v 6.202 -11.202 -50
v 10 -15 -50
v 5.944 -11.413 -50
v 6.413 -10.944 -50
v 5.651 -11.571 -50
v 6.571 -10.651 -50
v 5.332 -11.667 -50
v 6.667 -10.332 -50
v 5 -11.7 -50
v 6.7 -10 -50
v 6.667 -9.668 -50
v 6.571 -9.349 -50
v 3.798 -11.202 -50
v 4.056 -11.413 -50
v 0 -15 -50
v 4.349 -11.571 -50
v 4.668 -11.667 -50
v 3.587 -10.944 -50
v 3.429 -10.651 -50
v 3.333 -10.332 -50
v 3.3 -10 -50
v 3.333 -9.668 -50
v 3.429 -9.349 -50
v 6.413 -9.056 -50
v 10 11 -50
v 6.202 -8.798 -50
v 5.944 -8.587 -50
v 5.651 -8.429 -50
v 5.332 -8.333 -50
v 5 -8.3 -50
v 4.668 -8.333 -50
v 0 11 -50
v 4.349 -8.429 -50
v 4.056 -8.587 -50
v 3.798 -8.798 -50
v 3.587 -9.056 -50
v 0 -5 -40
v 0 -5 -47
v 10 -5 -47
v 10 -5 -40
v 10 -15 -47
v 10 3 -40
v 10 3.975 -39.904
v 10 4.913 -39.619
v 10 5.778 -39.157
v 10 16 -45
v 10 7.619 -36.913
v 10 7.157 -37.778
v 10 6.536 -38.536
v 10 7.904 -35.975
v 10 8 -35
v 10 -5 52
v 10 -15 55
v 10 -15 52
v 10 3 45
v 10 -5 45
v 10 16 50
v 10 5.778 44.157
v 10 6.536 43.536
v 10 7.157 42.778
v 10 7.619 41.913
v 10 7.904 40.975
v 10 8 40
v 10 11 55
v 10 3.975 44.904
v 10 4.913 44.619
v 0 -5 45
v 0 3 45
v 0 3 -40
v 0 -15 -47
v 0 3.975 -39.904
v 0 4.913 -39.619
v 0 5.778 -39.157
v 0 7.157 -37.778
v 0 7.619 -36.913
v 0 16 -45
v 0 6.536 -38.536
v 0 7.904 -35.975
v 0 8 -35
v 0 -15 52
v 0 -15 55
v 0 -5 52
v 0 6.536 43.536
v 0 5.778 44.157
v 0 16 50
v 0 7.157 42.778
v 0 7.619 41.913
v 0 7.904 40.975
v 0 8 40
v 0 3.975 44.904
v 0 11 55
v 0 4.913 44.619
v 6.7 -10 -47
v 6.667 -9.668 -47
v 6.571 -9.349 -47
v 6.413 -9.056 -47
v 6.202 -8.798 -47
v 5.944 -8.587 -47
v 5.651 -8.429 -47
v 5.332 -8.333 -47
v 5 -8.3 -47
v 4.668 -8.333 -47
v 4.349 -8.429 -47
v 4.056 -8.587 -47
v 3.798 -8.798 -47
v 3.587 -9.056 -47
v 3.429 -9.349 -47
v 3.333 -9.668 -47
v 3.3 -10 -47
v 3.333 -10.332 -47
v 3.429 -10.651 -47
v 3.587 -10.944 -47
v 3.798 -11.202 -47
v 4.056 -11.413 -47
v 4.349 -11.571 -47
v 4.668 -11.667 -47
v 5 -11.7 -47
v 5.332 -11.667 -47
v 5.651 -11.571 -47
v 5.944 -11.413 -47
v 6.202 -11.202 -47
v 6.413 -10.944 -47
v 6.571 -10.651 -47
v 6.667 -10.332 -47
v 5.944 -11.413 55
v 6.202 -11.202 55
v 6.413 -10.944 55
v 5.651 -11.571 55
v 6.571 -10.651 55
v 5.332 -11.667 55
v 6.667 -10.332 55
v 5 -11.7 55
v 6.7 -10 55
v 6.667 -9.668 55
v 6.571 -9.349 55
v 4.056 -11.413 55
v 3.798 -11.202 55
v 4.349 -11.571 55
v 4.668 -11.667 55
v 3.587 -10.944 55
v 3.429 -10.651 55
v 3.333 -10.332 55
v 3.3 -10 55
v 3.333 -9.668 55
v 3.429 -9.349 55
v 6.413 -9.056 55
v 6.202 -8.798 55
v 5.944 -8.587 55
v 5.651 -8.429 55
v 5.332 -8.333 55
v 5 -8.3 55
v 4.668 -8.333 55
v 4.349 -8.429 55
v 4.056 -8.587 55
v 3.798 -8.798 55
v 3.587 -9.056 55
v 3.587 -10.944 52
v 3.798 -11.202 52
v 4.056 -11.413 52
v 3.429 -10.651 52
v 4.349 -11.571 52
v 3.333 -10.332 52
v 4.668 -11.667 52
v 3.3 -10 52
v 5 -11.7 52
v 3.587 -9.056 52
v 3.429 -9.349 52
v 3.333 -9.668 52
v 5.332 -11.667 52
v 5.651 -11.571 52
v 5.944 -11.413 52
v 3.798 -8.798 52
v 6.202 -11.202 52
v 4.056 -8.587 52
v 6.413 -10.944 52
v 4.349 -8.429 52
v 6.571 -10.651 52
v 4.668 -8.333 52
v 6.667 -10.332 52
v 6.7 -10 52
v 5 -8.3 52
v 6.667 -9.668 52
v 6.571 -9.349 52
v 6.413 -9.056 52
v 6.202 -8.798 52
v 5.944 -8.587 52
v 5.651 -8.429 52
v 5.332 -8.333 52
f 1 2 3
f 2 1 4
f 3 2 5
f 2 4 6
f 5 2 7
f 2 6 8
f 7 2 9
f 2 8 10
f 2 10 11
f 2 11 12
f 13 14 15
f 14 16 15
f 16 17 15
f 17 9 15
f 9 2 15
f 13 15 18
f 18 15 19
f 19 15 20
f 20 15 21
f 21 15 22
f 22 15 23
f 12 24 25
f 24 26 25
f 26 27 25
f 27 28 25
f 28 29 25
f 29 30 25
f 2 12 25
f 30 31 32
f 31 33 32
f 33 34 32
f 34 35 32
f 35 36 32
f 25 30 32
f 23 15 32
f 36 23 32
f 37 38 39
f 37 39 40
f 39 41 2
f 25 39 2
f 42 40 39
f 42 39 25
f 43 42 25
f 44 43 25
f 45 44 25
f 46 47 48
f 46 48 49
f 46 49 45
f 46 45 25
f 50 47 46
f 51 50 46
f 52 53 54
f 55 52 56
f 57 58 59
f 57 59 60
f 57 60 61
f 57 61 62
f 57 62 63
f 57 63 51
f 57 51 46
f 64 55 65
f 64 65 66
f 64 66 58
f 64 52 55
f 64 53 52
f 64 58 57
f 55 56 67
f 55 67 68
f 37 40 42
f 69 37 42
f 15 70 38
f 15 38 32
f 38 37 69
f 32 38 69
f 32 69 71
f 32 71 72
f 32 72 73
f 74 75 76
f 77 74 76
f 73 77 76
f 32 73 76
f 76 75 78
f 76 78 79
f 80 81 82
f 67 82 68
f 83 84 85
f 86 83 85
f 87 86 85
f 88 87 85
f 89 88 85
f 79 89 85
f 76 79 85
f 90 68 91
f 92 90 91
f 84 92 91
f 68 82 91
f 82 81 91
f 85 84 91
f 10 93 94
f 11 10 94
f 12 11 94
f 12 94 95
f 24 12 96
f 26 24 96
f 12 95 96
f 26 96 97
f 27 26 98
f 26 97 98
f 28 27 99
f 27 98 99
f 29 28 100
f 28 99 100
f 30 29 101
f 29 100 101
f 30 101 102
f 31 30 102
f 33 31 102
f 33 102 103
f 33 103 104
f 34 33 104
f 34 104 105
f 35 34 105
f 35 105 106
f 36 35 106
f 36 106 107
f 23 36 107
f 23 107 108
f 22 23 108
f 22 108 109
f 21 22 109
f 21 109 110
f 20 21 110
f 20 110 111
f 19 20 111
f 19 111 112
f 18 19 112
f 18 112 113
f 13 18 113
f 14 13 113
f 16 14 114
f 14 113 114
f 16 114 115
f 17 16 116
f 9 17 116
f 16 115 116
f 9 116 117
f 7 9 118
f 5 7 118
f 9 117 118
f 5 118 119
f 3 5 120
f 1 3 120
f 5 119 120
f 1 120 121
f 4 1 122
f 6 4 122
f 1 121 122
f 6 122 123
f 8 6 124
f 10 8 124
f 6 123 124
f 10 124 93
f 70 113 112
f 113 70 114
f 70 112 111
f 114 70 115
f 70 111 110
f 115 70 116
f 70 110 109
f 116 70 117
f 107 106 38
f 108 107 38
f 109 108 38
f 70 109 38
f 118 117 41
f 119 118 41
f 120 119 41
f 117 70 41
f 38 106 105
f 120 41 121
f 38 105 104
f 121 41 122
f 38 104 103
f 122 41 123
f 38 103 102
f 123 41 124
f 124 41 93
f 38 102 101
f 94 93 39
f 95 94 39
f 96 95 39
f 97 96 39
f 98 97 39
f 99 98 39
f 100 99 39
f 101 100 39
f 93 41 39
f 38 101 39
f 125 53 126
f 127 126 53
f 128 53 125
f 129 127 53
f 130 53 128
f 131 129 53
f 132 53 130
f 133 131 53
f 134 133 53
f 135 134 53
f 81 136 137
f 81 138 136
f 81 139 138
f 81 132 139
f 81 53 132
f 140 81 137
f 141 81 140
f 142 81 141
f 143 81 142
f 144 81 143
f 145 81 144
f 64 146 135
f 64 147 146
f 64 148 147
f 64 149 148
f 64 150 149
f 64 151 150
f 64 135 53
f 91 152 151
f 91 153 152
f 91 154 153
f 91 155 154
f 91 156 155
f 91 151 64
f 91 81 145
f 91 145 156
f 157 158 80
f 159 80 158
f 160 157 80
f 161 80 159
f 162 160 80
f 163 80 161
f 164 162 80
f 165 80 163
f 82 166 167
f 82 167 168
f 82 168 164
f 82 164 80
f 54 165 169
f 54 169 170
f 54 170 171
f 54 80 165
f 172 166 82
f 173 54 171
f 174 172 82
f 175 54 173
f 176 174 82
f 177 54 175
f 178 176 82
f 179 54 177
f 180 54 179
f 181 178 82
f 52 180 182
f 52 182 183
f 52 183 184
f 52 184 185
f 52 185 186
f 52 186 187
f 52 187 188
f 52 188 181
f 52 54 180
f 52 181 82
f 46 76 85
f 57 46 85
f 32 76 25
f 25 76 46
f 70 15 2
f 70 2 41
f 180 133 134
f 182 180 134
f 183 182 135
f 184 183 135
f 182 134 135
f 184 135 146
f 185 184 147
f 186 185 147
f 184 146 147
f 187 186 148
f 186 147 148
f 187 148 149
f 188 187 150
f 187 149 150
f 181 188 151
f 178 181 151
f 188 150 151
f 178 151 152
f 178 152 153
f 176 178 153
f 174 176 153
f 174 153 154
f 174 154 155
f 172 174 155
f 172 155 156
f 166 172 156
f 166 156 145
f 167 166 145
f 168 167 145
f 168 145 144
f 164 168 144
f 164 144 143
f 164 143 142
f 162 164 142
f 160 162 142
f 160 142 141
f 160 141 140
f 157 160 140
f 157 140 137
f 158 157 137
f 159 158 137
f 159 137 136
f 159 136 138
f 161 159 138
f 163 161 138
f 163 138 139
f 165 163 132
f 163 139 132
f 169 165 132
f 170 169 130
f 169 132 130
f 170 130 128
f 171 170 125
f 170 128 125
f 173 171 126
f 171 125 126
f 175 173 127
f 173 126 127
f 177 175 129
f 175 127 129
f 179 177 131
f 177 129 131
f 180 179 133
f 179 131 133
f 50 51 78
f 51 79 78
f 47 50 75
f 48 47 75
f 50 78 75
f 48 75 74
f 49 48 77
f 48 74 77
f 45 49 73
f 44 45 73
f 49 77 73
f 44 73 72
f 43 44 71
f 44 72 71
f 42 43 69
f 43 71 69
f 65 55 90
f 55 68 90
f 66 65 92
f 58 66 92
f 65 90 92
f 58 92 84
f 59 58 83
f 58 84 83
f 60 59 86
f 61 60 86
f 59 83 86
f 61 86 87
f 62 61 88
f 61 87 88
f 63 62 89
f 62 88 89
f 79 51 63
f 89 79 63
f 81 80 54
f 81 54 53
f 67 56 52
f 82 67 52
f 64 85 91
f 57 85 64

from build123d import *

# Parameters (mm, degrees)
F0_W     = 31
F0_H     = 105
F1_DEPTH = 10
F2_W     = 20
F2_H     = 99
F3_DEPTH = 10.001
F4_W     = 13
F4_H     = 85
F5_DEPTH = 10.001
F6_SIZE  = 5
F7_R     = 1.7
F8_DEPTH = 105.001
F9_R     = 5


with BuildPart() as f1:
    # F0 (on Right) → F1 (new body)
    with BuildSketch(Plane.YZ):
        with Locations((0.5, 2.5)):
            Rectangle(F0_W, F0_H)
    extrude(amount=F1_DEPTH)

    # F2 (on face) → F3 (cut, through all)
    with BuildSketch(Plane.YZ.offset(10)):
        with Locations((-15, 2.5)):
            Rectangle(F2_W, F2_H)
    extrude(amount=-F3_DEPTH, mode=Mode.SUBTRACT)

    # F4 (on face) → F5 (cut, through all)
    with BuildSketch(Plane.YZ.offset(10)):
        with Locations((1.5, 2.5)):
            Rectangle(F4_W, F4_H)
    extrude(amount=-F5_DEPTH, mode=Mode.SUBTRACT)

    # F6
    f6_edges = [f1.edges().sort_by_distance(p)[0] for p in [
        (5, 16, 55),
        (5, 16, -50),
    ]]
    chamfer(f6_edges, length=F6_SIZE)

    # F7 (on face) → F8 (cut, through all)
    with BuildSketch(Plane.XY.offset(55)):
        with Locations((5, -10)):
            Circle(F7_R)
    extrude(amount=-F8_DEPTH, mode=Mode.SUBTRACT)

    # F9
    f9_edges = [f1.edges().sort_by_distance(p)[0] for p in [
        (5, 8, 45),
        (5, 8, -40),
    ]]
    fillet(f9_edges, radius=F9_R)


solid = f1.part
